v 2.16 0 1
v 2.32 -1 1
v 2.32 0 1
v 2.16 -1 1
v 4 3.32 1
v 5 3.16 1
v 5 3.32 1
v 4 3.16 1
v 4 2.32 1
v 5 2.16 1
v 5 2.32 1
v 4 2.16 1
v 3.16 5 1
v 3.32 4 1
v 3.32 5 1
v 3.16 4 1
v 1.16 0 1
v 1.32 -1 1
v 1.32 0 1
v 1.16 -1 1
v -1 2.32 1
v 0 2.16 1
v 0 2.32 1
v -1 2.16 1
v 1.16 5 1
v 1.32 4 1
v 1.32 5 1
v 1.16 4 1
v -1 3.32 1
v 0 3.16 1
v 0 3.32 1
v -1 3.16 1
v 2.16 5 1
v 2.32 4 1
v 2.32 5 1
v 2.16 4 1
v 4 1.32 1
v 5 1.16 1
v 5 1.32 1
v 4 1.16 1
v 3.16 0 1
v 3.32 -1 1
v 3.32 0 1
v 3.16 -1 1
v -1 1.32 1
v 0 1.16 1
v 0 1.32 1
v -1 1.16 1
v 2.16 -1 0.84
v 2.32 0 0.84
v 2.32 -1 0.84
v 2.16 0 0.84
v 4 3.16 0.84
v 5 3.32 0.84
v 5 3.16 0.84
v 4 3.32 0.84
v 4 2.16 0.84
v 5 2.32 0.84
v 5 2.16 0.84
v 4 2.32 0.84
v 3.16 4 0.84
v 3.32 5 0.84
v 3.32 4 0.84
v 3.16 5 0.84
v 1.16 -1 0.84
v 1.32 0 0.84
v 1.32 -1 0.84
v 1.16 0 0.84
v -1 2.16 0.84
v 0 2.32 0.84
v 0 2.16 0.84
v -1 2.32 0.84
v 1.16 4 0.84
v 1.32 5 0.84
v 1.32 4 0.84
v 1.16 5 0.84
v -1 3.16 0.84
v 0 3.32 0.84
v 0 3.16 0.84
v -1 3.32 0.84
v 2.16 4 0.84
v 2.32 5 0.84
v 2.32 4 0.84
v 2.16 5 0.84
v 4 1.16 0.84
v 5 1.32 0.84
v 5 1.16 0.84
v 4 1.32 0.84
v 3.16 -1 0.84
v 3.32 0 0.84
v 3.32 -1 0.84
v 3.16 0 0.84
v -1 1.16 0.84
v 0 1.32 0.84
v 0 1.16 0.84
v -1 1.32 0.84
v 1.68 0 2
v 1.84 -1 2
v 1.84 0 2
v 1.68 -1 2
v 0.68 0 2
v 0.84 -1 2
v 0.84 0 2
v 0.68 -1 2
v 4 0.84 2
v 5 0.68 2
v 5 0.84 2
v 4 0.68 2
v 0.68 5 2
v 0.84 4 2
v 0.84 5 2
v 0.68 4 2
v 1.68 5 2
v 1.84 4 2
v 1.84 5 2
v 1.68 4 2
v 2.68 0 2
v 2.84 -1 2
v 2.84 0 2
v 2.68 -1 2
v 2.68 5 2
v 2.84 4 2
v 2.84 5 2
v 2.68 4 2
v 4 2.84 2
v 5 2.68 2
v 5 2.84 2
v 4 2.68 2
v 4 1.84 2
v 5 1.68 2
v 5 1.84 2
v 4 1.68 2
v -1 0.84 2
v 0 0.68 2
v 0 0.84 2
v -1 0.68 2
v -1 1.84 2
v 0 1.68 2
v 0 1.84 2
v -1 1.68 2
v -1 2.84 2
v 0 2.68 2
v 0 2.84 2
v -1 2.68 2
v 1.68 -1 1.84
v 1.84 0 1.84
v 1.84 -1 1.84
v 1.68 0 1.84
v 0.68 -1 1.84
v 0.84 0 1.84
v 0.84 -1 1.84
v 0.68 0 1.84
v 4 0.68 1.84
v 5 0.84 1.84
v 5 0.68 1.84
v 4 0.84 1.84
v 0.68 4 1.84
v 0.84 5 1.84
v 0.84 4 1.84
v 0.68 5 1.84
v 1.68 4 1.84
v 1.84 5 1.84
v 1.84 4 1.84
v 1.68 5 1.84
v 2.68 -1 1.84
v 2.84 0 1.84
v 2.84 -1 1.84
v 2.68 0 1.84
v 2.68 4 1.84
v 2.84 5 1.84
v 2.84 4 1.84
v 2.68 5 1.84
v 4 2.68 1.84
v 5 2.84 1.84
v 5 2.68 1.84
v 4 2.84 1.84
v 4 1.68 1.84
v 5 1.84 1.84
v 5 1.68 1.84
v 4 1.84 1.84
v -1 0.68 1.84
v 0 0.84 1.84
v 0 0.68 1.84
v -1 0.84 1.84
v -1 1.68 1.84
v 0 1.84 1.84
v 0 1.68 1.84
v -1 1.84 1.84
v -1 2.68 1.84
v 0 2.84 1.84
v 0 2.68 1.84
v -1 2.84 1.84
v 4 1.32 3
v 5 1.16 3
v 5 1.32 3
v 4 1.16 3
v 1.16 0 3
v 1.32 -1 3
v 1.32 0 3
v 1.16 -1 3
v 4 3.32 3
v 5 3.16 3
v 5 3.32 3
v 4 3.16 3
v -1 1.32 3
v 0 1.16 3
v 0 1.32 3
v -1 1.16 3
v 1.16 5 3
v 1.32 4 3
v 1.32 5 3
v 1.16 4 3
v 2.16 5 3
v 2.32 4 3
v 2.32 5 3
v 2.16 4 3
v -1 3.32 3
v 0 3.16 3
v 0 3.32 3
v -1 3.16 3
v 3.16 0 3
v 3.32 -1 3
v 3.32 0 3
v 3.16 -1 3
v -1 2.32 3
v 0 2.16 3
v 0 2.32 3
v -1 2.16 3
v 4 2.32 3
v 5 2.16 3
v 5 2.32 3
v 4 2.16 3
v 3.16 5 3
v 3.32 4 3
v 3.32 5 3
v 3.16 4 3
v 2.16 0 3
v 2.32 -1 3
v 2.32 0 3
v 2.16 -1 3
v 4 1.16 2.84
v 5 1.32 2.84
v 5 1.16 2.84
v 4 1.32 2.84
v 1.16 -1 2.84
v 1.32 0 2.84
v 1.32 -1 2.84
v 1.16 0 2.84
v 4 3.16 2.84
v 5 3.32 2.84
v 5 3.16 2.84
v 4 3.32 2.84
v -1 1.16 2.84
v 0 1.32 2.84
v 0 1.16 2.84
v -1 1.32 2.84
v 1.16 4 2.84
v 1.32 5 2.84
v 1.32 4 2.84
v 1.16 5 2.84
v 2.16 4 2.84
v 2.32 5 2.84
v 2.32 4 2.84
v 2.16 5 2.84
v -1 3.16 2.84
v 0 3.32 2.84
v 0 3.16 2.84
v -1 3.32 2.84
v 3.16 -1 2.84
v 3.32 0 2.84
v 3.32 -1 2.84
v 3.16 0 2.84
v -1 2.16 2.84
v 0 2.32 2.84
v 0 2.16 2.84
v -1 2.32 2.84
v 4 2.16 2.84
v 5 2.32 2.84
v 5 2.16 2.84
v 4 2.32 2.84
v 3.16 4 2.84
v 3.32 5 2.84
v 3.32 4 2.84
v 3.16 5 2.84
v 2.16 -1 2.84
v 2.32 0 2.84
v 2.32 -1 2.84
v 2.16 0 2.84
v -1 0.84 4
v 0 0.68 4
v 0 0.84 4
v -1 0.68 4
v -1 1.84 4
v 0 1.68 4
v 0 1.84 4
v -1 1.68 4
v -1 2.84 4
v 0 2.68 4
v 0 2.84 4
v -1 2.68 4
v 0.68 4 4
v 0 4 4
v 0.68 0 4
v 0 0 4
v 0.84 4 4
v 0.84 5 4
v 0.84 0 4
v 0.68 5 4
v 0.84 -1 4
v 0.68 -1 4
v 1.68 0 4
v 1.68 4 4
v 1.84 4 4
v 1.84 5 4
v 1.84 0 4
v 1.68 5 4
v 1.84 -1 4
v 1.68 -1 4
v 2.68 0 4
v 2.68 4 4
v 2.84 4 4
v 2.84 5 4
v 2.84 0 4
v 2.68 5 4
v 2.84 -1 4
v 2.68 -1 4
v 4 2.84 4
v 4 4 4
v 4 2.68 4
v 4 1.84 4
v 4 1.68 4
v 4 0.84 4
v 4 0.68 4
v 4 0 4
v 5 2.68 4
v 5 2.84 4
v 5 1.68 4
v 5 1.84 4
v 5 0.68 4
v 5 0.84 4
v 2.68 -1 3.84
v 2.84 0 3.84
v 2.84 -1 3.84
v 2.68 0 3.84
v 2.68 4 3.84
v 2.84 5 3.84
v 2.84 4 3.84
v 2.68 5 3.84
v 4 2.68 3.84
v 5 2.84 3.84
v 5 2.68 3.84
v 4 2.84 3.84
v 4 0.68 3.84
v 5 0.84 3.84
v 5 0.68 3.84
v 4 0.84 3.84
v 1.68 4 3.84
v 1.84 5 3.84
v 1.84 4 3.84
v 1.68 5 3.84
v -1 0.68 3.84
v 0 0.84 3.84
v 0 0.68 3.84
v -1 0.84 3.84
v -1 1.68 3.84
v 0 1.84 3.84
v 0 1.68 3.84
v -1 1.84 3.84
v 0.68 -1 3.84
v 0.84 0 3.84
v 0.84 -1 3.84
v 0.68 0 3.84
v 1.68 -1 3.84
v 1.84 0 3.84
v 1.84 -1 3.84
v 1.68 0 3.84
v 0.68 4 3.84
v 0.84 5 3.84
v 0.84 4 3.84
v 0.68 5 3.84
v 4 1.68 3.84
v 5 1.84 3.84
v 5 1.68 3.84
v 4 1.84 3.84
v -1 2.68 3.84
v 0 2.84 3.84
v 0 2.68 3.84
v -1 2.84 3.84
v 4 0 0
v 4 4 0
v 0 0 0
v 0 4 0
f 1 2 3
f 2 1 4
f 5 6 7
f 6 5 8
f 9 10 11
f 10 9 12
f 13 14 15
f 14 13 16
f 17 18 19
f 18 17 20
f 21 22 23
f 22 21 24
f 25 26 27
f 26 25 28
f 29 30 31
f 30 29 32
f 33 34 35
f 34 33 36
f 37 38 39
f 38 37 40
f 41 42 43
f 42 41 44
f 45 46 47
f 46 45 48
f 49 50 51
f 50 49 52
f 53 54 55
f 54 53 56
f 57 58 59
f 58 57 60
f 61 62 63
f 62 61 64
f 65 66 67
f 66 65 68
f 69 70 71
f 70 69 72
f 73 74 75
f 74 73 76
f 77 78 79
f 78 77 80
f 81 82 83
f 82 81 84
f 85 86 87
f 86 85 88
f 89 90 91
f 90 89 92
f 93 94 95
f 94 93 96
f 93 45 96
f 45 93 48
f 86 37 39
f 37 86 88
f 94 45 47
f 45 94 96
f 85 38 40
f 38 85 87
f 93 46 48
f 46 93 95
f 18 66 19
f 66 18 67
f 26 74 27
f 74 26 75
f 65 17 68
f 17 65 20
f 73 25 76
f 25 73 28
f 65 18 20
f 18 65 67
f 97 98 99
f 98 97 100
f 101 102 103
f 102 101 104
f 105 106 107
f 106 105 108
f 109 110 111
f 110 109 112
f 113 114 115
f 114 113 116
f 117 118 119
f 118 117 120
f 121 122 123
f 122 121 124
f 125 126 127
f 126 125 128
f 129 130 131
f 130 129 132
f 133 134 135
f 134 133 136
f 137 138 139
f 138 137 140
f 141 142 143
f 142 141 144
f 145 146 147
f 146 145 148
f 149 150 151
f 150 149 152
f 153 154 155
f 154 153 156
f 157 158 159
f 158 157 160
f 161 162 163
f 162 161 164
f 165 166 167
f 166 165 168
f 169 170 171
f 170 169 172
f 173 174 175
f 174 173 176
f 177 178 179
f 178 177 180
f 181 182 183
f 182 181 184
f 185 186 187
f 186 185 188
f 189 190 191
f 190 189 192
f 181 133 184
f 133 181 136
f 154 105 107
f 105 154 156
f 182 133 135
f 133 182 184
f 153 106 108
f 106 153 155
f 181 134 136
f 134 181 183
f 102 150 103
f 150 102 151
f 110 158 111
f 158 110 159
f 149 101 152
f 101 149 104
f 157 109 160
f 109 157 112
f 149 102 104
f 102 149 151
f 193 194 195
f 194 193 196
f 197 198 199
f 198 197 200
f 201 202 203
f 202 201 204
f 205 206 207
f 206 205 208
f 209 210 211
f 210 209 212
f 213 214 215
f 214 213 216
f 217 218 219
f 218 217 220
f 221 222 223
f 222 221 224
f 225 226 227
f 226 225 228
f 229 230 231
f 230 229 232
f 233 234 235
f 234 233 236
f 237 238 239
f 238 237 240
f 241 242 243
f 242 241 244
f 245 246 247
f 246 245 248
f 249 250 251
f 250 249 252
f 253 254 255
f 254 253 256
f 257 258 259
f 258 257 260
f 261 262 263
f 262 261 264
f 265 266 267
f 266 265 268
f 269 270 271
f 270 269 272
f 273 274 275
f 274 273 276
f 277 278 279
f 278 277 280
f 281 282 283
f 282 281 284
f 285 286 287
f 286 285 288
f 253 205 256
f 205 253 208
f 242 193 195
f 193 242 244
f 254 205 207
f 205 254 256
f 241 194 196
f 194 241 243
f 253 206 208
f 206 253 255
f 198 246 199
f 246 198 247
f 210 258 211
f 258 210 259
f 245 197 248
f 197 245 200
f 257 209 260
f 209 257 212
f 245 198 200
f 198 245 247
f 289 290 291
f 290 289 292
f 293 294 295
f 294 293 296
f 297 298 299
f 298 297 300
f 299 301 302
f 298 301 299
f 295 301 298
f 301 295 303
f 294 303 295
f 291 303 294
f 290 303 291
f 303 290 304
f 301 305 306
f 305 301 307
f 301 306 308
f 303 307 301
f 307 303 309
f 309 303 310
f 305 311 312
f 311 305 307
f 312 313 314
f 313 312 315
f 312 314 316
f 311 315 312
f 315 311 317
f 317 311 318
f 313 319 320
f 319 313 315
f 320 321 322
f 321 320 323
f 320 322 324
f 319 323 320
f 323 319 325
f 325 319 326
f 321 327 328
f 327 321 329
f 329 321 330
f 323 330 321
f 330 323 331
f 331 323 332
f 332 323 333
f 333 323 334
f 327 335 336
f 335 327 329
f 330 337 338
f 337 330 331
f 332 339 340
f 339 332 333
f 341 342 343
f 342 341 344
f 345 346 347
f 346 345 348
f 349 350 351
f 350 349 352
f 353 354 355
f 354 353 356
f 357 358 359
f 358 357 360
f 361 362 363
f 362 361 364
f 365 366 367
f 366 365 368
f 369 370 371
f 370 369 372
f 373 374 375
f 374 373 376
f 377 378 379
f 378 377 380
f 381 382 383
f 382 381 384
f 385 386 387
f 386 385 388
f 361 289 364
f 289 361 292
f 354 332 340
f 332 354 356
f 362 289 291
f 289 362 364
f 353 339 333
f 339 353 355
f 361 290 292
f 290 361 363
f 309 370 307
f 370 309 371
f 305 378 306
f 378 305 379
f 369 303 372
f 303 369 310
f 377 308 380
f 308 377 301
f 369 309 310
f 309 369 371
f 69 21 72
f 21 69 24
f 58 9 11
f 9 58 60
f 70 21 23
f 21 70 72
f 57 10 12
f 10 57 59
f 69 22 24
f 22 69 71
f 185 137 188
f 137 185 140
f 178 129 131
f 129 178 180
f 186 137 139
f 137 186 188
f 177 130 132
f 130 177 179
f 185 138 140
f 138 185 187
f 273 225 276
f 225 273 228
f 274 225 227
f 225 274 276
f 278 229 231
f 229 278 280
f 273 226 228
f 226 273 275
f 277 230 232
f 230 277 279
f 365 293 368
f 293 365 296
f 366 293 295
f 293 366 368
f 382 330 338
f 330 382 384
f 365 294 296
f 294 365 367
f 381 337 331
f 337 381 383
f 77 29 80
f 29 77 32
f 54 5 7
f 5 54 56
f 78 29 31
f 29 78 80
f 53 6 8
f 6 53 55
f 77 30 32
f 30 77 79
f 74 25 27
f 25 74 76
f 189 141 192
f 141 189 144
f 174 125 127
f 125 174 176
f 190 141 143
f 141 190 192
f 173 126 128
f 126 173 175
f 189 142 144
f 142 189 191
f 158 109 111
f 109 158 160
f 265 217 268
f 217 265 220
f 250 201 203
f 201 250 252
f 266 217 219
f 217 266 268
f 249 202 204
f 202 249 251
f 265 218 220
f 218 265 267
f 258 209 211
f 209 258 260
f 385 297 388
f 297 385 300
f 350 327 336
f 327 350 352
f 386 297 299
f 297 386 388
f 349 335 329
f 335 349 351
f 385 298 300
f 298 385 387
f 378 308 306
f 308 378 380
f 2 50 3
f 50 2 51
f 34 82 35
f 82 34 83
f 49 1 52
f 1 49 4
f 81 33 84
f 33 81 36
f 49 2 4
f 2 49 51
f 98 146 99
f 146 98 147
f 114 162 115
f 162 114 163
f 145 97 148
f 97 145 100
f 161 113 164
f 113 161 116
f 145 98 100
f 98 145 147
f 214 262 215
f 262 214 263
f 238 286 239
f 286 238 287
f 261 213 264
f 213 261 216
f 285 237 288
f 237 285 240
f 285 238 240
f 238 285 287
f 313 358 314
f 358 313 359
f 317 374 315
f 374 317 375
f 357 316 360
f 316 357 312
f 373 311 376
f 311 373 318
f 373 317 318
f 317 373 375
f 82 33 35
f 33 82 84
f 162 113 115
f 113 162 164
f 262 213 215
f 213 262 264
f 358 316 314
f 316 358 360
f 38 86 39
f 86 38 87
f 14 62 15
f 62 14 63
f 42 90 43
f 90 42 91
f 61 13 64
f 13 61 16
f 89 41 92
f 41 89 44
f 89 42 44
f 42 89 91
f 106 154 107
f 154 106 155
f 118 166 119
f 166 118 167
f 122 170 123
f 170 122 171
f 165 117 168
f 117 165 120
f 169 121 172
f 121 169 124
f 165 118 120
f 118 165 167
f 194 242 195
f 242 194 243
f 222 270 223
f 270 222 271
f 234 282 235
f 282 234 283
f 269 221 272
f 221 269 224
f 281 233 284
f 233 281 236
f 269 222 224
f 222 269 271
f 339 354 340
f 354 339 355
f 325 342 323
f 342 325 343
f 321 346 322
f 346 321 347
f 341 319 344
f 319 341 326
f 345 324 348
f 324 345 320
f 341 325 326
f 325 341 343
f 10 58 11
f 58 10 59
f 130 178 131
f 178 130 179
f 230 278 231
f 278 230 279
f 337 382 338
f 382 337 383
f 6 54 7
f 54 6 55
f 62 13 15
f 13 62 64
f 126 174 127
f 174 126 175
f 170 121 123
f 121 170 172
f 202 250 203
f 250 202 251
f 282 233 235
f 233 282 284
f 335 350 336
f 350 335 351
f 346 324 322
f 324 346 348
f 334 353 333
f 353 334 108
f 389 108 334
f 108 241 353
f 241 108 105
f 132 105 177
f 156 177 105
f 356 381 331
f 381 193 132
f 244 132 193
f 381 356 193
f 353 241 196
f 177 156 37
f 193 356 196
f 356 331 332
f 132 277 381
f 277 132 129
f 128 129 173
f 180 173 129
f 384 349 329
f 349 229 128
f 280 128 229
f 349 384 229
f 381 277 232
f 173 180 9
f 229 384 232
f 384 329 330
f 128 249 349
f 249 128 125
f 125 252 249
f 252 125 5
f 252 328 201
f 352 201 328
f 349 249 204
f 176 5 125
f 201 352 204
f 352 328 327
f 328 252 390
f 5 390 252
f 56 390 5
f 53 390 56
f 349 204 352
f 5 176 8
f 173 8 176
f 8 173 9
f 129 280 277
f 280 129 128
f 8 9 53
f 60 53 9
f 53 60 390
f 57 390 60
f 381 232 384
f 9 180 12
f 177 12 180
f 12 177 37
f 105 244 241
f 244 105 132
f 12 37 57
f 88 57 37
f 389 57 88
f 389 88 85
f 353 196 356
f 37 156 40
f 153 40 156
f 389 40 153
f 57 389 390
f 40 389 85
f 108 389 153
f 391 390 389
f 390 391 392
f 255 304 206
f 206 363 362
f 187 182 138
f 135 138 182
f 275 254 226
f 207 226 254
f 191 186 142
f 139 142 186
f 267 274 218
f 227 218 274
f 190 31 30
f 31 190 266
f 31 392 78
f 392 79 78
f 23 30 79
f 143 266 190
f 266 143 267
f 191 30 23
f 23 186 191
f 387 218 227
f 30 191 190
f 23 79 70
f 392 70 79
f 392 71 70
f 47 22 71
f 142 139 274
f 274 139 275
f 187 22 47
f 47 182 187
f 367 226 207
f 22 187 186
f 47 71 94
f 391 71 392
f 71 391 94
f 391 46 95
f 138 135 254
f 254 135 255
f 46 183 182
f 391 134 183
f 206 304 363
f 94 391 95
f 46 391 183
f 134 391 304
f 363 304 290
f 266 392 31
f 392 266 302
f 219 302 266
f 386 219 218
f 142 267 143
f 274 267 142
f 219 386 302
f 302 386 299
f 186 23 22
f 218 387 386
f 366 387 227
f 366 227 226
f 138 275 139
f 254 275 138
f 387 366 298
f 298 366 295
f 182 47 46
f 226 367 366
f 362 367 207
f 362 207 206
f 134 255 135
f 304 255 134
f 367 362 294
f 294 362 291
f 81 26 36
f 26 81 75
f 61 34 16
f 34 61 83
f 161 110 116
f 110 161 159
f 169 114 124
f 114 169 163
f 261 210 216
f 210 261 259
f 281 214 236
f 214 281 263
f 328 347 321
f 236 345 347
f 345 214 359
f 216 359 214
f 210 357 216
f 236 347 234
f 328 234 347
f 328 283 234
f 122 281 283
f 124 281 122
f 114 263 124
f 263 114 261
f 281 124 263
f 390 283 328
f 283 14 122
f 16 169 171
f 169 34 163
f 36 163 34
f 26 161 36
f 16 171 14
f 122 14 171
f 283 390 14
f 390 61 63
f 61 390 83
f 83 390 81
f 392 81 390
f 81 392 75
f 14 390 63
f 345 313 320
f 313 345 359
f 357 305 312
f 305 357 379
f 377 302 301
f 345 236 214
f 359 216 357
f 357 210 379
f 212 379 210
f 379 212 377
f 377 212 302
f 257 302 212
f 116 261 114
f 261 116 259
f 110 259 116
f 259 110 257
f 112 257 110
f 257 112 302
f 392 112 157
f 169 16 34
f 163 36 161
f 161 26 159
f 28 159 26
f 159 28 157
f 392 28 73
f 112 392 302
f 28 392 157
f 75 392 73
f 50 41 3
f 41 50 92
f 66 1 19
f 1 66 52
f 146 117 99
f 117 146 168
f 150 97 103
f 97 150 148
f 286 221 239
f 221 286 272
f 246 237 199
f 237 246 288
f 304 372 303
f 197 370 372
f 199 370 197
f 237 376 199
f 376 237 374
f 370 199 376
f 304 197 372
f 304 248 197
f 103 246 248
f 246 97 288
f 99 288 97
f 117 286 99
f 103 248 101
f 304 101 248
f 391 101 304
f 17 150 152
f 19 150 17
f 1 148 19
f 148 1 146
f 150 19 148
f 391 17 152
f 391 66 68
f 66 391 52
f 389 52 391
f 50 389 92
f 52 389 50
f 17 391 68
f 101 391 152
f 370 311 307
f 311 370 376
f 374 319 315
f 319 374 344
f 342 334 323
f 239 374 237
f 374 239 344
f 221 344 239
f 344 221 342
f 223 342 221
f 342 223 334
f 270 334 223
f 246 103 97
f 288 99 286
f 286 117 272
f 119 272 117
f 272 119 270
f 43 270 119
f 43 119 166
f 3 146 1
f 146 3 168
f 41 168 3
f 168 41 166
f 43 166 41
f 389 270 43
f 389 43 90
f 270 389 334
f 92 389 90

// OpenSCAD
hair_width=0.16;
width=4;
length=4;
height=4;

hw=hair_width;

hair(width,length,height);
scale([width,length,height]) cube();

module hair(w,l,h)
{
		for(x=[1:w-1],y=[1:l-1], z=[1:h])
		{
		translate([x,y,z]) scale([4, hw, hw]) translate([0,(z%2-0.5)*3,-0.5]) cube(center=true);
		translate([x,y,z]) scale([hw, 4, hw]) translate([(z%2-0.5)*3,0,-0.5]) cube(center=true);
		}
}
